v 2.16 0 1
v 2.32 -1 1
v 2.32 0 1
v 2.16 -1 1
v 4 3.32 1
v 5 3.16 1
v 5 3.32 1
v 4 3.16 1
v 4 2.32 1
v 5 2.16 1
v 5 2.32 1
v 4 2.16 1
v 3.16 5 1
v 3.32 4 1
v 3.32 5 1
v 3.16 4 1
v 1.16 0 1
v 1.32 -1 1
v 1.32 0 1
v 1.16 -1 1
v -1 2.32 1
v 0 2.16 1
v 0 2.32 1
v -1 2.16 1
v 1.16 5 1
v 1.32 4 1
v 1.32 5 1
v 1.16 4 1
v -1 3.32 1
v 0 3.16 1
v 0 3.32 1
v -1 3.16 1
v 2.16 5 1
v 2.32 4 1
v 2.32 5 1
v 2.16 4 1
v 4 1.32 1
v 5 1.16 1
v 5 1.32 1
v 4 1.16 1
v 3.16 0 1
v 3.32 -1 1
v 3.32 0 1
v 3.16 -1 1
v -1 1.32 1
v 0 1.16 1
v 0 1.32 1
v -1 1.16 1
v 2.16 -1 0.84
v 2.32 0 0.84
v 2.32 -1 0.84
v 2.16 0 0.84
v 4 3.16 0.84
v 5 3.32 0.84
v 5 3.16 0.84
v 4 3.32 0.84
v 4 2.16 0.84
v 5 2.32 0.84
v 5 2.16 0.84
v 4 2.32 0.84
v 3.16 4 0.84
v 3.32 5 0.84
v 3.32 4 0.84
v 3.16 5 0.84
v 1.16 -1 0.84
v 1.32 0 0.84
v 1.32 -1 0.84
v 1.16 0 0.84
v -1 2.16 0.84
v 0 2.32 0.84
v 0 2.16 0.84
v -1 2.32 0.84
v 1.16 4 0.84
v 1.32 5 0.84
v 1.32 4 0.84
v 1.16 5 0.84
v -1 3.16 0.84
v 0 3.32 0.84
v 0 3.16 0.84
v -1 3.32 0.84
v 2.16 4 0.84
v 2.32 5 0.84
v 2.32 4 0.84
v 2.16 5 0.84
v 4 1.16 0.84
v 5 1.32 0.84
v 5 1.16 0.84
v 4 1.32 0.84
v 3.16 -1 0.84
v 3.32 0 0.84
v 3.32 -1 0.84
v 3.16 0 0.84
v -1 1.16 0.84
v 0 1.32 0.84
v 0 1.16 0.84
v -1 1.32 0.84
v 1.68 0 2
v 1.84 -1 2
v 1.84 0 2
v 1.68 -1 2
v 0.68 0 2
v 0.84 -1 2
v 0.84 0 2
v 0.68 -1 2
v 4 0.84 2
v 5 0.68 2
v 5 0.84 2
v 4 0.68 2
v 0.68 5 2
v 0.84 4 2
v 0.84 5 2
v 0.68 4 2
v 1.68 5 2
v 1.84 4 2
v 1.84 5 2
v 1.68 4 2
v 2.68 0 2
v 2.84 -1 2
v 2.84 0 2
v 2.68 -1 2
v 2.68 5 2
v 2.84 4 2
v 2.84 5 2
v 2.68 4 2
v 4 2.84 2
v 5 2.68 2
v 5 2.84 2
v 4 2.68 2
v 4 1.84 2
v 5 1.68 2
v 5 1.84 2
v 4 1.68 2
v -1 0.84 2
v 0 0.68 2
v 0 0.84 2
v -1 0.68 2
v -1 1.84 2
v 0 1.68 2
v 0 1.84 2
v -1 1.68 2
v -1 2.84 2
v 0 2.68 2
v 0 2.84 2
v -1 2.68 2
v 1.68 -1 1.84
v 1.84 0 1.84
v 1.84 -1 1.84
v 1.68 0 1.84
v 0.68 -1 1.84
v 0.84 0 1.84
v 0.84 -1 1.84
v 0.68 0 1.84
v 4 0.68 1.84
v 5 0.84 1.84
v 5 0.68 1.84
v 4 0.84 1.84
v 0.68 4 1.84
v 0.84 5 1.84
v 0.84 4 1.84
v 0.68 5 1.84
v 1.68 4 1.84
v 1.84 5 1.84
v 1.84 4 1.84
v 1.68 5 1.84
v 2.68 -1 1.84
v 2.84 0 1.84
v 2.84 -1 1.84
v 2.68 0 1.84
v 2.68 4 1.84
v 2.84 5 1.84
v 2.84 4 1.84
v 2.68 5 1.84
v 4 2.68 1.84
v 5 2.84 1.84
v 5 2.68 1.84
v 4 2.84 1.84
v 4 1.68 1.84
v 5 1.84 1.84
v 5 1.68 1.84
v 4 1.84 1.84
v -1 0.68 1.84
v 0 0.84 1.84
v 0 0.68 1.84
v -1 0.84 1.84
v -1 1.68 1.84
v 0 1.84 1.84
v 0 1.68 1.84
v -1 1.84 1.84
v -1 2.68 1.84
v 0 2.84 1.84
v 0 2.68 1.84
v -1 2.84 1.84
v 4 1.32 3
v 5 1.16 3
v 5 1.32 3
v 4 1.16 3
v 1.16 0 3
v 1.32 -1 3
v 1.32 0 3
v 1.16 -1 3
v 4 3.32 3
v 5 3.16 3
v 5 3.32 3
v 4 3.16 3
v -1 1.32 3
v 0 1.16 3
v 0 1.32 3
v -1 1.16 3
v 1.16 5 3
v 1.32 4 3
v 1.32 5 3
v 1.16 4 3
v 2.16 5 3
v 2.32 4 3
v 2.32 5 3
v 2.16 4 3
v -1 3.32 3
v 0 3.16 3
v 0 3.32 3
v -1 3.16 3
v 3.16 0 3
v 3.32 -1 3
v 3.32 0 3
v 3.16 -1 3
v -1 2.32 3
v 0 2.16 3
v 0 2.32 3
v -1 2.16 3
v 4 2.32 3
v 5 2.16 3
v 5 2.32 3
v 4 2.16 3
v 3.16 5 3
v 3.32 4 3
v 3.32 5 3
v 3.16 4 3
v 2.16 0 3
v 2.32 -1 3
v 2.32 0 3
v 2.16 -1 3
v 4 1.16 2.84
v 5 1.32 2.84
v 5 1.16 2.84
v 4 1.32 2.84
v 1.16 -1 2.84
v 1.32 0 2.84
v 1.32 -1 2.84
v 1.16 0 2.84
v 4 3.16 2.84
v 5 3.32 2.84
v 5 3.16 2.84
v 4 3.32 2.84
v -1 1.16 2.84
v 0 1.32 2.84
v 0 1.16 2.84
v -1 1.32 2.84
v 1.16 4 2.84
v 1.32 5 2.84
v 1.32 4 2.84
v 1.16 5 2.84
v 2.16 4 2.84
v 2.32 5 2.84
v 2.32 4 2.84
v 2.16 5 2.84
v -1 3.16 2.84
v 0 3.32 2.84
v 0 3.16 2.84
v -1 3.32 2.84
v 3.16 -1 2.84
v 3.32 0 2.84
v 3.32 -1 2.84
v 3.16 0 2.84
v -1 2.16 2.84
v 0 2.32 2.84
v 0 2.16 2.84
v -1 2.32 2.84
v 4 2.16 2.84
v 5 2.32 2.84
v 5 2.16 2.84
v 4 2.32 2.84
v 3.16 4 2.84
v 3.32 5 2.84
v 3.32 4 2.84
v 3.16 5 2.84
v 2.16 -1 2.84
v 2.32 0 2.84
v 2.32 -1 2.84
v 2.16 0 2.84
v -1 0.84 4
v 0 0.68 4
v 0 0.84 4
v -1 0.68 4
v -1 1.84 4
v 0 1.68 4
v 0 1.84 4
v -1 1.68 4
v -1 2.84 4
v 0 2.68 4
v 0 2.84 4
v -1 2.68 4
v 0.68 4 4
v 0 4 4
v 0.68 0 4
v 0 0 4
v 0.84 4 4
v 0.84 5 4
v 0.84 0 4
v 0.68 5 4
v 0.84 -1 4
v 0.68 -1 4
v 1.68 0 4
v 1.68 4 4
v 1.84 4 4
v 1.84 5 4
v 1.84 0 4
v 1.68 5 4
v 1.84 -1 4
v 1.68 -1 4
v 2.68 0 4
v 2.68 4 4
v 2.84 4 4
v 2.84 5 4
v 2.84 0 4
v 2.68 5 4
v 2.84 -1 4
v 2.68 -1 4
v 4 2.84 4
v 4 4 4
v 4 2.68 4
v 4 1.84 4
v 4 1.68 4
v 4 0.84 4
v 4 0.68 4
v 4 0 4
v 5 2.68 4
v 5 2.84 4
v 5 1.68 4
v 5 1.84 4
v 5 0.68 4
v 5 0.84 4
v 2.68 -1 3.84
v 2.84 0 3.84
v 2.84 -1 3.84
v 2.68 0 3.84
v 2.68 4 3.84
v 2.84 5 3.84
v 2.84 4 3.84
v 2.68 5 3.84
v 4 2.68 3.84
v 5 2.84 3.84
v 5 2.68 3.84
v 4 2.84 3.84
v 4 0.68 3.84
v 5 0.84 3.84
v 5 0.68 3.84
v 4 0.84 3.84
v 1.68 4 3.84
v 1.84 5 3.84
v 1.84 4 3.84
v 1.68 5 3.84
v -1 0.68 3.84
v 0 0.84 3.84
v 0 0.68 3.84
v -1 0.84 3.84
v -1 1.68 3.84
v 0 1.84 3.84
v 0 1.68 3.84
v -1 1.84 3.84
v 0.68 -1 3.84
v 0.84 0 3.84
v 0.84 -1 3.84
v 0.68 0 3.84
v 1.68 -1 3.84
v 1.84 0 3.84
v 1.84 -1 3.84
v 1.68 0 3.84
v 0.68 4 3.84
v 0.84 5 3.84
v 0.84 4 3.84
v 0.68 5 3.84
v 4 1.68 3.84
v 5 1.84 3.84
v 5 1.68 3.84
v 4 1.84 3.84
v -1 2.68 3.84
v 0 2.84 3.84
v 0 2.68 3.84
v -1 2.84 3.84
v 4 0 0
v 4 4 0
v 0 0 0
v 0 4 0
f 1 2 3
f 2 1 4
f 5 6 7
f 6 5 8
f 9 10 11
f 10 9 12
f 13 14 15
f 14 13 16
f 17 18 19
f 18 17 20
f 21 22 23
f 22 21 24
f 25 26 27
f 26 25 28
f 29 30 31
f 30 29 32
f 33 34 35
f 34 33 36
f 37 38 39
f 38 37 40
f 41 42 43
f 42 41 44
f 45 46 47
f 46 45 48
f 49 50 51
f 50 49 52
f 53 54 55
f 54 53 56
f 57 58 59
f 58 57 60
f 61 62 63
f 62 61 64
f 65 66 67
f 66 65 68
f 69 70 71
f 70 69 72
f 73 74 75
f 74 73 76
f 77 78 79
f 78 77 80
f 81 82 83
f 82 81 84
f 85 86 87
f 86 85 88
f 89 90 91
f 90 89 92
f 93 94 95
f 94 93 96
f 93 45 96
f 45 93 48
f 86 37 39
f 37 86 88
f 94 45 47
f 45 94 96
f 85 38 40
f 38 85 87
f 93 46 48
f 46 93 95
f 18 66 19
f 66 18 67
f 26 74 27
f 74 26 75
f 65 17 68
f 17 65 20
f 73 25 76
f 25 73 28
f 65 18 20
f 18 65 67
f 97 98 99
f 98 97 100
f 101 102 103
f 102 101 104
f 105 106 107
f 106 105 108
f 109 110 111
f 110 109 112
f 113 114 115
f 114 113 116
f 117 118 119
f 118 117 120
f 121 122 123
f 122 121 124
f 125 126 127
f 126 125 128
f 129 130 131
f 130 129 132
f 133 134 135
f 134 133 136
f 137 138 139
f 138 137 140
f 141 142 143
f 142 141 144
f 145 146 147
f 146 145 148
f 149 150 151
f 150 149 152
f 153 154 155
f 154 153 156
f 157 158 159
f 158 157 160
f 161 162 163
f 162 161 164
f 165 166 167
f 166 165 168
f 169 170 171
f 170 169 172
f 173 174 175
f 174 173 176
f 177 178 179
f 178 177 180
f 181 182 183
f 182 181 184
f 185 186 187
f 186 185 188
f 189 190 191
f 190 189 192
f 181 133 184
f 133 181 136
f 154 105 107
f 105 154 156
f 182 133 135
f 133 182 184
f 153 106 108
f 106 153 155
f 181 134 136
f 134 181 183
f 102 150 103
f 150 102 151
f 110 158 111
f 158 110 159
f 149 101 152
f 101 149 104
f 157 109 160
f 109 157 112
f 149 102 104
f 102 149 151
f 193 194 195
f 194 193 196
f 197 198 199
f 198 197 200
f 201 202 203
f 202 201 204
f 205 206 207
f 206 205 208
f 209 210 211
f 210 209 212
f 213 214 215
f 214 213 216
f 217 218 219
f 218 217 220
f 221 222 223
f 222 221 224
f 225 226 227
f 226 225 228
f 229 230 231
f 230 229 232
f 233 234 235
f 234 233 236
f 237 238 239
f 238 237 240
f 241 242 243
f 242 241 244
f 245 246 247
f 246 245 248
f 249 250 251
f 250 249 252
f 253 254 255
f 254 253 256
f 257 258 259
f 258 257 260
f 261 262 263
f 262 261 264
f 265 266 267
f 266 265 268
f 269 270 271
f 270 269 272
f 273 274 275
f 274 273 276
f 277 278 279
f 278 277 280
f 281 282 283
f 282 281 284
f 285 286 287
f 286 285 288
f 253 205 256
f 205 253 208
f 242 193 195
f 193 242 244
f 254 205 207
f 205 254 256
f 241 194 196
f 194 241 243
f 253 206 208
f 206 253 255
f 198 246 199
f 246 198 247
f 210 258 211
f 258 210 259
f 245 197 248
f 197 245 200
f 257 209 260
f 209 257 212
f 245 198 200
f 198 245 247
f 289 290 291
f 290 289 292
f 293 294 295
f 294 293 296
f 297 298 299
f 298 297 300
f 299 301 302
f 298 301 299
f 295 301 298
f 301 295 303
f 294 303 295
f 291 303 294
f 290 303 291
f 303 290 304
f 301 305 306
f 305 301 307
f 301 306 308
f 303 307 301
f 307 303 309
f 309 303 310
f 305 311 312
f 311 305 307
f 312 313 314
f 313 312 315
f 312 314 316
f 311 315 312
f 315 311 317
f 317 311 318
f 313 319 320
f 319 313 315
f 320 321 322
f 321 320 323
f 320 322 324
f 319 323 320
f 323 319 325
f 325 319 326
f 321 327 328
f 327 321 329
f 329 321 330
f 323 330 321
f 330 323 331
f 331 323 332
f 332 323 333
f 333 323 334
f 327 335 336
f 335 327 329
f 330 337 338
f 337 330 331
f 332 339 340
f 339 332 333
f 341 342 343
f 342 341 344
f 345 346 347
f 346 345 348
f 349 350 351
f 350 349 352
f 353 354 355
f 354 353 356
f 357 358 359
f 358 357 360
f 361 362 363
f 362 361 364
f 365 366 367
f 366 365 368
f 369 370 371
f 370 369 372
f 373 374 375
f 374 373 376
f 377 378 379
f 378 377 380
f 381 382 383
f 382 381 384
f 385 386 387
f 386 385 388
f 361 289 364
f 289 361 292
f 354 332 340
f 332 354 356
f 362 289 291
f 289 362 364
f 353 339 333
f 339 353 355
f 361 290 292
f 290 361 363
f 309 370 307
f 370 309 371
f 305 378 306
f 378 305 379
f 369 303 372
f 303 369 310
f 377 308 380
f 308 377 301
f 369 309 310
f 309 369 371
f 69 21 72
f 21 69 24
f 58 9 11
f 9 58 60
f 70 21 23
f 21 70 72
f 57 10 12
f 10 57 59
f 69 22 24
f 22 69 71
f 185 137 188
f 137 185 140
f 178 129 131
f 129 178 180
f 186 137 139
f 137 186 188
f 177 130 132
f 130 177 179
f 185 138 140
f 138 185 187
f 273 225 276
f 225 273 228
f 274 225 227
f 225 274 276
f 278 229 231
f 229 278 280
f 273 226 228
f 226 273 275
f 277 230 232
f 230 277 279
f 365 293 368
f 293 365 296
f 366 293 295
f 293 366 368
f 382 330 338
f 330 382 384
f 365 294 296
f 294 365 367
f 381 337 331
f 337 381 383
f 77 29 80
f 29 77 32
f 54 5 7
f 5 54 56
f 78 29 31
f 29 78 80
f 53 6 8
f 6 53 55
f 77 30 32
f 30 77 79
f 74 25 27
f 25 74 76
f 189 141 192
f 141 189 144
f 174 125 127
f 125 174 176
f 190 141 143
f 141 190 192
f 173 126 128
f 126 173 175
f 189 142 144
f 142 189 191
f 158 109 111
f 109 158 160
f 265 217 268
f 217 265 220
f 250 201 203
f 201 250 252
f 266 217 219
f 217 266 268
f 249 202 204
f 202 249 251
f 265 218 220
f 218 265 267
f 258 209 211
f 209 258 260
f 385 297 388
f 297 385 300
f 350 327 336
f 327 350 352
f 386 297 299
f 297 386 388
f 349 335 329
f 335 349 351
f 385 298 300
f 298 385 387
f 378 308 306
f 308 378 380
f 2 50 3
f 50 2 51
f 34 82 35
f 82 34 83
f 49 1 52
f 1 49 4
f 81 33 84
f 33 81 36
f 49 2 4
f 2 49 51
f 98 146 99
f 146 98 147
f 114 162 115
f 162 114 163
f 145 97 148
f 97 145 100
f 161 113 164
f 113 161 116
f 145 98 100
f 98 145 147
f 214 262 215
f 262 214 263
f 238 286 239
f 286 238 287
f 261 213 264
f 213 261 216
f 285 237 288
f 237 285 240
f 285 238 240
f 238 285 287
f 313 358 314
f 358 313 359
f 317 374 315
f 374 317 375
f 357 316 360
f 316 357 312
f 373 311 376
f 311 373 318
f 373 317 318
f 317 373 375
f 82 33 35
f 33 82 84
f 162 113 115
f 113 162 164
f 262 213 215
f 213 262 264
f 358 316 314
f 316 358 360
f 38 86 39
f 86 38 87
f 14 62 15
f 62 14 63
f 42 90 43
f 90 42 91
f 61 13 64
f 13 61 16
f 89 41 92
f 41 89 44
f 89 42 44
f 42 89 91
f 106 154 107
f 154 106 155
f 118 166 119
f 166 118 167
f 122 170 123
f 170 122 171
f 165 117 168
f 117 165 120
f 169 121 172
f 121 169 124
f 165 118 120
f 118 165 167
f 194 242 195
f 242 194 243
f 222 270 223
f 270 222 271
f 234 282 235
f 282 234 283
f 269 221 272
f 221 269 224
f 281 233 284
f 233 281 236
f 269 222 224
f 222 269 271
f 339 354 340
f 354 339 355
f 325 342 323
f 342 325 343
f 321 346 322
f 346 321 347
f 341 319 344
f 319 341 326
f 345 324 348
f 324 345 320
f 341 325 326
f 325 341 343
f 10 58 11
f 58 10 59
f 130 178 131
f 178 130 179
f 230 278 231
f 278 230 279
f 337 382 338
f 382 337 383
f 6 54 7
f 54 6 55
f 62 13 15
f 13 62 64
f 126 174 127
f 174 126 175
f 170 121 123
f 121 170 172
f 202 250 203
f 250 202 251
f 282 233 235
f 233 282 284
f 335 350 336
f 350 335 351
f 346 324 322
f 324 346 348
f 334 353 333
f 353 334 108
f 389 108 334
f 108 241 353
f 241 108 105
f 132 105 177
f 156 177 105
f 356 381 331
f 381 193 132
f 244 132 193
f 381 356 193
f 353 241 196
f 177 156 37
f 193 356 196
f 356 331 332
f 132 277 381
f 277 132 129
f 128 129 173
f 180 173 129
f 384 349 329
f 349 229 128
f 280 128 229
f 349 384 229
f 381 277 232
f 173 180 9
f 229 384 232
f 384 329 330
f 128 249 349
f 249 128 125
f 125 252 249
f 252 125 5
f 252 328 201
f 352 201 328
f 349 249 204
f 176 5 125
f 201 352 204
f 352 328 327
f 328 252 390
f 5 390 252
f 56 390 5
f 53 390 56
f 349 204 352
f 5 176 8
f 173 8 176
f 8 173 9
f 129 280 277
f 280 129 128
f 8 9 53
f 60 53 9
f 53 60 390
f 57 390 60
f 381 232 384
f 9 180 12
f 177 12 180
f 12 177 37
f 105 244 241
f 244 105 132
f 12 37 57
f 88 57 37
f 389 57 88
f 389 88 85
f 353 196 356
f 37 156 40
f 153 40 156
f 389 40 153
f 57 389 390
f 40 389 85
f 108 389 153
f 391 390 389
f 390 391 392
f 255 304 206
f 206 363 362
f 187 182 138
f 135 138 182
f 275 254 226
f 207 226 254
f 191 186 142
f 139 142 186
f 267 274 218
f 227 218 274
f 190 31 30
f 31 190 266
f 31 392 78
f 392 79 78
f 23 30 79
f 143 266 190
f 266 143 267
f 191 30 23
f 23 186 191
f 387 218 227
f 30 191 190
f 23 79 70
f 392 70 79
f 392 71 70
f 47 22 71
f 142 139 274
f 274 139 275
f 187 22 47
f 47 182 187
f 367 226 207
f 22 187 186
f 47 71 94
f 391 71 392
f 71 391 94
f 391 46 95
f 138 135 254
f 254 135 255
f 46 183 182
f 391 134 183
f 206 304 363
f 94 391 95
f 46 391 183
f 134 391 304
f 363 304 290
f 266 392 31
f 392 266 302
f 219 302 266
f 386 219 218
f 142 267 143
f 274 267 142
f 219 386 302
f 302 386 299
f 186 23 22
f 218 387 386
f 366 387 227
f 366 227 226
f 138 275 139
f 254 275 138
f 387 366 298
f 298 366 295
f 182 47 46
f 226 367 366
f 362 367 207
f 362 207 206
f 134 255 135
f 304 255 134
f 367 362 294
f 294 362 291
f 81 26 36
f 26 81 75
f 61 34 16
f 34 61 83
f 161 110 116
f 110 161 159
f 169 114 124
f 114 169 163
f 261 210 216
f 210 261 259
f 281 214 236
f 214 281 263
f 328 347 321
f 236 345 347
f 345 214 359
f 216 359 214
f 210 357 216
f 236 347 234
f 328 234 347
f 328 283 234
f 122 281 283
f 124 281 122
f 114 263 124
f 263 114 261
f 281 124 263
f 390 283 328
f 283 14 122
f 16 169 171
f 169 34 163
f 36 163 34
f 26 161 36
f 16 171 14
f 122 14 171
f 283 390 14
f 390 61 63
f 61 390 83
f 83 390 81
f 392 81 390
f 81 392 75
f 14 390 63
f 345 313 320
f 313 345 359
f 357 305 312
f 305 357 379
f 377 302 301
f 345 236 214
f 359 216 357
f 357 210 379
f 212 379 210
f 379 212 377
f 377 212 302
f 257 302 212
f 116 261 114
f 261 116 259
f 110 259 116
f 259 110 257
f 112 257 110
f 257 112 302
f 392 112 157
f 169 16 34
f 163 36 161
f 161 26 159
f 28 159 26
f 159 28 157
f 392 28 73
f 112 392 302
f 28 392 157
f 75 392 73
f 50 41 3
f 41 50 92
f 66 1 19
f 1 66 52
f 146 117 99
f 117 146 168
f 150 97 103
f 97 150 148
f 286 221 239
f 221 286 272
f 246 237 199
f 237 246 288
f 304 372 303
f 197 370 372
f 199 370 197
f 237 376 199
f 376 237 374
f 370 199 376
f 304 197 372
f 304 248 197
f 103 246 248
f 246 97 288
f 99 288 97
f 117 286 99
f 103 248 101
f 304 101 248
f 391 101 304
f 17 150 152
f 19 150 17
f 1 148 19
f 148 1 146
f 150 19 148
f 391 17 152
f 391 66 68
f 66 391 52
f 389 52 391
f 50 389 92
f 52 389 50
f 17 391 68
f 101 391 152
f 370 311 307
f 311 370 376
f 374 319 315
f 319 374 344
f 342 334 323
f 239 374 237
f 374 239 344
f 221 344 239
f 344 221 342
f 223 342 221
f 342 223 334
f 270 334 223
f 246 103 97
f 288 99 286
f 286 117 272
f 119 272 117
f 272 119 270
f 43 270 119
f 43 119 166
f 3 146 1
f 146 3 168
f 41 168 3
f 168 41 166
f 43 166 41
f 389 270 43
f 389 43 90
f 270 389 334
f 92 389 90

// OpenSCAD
hair_width=0.16;
width=4;
length=4;
height=4;

hw=hair_width;

hair(width,length,height);
scale([width,length,height]) cube();

module hair(w,l,h)
{
		for(x=[1:w-1],y=[1:l-1], z=[1:h])
		{
		translate([x,y,z]) scale([4, hw, hw]) translate([0,(z%2-0.5)*3,-0.5]) cube(center=true);
		translate([x,y,z]) scale([hw, 4, hw]) translate([(z%2-0.5)*3,0,-0.5]) cube(center=true);
		}
}
